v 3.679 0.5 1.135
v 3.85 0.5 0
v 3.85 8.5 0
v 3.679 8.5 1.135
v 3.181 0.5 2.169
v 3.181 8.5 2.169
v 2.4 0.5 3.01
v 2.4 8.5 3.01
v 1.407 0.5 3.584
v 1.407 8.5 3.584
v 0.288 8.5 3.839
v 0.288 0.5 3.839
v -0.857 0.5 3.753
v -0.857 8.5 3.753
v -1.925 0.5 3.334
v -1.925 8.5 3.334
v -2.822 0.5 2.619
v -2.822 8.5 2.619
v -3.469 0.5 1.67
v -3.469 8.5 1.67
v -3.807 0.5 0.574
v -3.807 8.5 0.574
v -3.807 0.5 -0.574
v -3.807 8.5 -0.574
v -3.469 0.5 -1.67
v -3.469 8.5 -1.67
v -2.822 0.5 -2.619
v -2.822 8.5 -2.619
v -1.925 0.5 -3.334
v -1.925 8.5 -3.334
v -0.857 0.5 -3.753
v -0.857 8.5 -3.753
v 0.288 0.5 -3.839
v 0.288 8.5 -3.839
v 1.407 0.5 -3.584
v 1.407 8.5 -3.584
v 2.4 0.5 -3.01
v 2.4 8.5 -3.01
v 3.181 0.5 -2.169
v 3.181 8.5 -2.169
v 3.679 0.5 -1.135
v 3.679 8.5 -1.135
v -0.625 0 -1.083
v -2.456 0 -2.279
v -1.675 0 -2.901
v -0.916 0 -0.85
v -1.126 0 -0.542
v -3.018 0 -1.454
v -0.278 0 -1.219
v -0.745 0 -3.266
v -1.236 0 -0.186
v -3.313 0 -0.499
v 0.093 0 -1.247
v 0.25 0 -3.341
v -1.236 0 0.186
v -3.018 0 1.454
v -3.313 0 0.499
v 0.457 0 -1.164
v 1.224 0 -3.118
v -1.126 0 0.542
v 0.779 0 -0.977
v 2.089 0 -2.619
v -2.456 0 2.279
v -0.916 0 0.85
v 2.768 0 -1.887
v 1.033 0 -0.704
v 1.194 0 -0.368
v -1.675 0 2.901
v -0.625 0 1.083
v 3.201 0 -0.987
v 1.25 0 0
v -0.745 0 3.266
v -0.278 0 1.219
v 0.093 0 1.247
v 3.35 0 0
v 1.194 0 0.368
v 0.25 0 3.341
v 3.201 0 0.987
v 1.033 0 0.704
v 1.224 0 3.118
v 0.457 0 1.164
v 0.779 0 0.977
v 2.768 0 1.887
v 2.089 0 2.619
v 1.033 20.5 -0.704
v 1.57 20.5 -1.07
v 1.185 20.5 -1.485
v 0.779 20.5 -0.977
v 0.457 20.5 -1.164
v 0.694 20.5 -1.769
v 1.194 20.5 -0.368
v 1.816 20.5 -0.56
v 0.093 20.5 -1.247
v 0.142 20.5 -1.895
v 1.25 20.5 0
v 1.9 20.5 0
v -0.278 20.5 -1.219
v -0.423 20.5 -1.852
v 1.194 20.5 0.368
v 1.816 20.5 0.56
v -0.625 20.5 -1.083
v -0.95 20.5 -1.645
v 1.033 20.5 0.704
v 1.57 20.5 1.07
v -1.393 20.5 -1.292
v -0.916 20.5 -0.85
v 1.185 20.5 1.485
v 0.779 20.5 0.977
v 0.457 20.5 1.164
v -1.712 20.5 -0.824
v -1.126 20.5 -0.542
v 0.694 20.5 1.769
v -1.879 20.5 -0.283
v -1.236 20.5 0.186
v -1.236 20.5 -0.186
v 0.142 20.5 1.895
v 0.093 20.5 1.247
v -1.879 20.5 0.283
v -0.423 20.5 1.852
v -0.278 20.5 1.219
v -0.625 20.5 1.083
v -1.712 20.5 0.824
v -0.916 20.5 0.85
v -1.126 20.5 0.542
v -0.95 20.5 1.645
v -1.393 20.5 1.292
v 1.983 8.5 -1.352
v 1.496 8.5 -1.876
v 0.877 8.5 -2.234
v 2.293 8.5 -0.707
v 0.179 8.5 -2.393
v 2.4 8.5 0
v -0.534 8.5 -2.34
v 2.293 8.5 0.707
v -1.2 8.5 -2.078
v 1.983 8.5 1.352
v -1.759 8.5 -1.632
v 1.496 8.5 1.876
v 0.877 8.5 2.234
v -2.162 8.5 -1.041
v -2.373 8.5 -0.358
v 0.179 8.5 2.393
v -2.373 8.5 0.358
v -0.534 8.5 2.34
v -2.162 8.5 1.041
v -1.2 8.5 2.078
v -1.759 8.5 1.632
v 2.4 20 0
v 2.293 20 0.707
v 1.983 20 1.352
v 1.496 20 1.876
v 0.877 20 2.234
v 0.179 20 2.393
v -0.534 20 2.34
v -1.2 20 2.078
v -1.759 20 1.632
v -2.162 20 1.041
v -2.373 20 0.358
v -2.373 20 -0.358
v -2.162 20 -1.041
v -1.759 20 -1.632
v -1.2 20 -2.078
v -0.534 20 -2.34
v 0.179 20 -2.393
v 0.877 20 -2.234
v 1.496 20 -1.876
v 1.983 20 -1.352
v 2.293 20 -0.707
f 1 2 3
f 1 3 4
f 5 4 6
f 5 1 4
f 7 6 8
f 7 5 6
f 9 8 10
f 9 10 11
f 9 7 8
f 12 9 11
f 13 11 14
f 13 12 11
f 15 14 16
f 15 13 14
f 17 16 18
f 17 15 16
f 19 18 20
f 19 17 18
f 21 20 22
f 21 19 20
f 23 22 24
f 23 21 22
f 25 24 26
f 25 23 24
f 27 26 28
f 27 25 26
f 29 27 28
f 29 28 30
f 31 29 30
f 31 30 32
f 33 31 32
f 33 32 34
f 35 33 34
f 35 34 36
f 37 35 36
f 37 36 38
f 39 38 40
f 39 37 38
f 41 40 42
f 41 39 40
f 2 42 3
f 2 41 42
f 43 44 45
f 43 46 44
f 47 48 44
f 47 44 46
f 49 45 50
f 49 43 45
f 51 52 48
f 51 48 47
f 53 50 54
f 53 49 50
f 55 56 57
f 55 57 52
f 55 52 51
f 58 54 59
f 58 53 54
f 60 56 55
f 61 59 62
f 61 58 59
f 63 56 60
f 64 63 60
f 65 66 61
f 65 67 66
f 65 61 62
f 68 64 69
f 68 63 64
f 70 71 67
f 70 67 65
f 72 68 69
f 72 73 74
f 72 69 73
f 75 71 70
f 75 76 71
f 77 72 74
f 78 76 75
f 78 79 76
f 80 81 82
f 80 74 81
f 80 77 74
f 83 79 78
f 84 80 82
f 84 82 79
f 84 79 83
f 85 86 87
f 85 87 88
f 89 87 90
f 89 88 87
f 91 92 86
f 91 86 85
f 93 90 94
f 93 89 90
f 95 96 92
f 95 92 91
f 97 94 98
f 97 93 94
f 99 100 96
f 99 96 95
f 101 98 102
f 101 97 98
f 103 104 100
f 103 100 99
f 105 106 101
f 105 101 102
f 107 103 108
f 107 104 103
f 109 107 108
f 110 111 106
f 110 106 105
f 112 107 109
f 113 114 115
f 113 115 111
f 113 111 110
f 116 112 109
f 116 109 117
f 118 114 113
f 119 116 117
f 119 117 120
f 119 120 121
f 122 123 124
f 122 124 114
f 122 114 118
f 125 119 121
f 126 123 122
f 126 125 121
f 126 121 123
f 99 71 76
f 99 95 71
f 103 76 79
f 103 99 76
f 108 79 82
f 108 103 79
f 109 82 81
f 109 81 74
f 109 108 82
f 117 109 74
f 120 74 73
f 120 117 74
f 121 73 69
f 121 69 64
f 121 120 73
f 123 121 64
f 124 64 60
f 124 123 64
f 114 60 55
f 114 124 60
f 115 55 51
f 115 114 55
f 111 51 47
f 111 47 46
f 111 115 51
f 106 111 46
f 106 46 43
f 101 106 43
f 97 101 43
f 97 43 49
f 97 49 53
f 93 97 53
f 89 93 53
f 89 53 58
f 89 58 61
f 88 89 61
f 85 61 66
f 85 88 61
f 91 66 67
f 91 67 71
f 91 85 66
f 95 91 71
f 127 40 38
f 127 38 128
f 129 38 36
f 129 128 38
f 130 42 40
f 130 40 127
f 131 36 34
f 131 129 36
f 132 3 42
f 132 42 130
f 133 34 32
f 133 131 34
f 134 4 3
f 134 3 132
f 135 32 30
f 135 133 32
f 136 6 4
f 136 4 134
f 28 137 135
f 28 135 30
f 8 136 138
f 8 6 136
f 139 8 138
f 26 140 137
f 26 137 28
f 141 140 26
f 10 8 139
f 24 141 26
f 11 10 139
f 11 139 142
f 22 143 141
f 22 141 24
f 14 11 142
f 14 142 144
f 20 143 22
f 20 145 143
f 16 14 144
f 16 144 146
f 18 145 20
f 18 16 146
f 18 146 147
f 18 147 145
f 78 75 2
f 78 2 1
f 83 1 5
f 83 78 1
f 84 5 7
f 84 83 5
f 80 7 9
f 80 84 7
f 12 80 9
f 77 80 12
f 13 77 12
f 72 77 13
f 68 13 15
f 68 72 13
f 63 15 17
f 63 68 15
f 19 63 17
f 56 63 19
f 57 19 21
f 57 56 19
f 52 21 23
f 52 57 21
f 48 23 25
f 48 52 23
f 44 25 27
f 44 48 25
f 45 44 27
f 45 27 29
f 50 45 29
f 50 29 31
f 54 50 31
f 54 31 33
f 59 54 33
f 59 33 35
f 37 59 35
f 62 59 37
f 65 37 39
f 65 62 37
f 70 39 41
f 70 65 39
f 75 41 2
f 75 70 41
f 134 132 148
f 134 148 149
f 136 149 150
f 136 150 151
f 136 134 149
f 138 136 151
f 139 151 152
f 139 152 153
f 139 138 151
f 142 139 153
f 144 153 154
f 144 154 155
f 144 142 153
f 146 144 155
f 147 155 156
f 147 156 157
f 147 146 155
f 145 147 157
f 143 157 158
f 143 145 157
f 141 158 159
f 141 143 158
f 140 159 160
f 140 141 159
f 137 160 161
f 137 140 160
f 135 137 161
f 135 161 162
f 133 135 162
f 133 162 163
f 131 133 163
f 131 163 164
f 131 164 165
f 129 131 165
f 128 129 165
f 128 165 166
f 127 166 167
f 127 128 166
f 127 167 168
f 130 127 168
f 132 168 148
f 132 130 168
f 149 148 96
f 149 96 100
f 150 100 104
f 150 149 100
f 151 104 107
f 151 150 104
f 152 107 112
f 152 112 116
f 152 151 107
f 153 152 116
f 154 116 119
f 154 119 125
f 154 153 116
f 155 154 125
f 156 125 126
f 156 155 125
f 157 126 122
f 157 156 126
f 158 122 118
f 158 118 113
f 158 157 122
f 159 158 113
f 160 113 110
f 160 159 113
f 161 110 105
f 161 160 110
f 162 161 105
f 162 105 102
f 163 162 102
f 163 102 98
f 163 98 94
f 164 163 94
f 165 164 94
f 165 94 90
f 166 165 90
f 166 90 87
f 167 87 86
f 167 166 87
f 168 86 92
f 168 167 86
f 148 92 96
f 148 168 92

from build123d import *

# Parameters (mm, degrees)
CHAMFER1_SIZE = 0.5


with BuildPart() as part:
    # Sketch1 → Revolve1 (revolve)
    with BuildSketch(Plane.XY):
        Polygon((1.25, 0), (1.25, 20.5), (2.4, 20.5), (2.4, 8.5), (3.85, 8.5), (3.85, 0), align=None)
    revolve(axis=Axis((0, 9.717567568, 0), (0, -1, 0)))

    # Chamfer1
    chamfer1_edges = [part.edges().sort_by_distance(p)[0] for p in [
        (-3.85, 0, 0),
        (-2.4, 20.5, 0),
    ]]
    chamfer(chamfer1_edges, length=CHAMFER1_SIZE)


solid = part.part
